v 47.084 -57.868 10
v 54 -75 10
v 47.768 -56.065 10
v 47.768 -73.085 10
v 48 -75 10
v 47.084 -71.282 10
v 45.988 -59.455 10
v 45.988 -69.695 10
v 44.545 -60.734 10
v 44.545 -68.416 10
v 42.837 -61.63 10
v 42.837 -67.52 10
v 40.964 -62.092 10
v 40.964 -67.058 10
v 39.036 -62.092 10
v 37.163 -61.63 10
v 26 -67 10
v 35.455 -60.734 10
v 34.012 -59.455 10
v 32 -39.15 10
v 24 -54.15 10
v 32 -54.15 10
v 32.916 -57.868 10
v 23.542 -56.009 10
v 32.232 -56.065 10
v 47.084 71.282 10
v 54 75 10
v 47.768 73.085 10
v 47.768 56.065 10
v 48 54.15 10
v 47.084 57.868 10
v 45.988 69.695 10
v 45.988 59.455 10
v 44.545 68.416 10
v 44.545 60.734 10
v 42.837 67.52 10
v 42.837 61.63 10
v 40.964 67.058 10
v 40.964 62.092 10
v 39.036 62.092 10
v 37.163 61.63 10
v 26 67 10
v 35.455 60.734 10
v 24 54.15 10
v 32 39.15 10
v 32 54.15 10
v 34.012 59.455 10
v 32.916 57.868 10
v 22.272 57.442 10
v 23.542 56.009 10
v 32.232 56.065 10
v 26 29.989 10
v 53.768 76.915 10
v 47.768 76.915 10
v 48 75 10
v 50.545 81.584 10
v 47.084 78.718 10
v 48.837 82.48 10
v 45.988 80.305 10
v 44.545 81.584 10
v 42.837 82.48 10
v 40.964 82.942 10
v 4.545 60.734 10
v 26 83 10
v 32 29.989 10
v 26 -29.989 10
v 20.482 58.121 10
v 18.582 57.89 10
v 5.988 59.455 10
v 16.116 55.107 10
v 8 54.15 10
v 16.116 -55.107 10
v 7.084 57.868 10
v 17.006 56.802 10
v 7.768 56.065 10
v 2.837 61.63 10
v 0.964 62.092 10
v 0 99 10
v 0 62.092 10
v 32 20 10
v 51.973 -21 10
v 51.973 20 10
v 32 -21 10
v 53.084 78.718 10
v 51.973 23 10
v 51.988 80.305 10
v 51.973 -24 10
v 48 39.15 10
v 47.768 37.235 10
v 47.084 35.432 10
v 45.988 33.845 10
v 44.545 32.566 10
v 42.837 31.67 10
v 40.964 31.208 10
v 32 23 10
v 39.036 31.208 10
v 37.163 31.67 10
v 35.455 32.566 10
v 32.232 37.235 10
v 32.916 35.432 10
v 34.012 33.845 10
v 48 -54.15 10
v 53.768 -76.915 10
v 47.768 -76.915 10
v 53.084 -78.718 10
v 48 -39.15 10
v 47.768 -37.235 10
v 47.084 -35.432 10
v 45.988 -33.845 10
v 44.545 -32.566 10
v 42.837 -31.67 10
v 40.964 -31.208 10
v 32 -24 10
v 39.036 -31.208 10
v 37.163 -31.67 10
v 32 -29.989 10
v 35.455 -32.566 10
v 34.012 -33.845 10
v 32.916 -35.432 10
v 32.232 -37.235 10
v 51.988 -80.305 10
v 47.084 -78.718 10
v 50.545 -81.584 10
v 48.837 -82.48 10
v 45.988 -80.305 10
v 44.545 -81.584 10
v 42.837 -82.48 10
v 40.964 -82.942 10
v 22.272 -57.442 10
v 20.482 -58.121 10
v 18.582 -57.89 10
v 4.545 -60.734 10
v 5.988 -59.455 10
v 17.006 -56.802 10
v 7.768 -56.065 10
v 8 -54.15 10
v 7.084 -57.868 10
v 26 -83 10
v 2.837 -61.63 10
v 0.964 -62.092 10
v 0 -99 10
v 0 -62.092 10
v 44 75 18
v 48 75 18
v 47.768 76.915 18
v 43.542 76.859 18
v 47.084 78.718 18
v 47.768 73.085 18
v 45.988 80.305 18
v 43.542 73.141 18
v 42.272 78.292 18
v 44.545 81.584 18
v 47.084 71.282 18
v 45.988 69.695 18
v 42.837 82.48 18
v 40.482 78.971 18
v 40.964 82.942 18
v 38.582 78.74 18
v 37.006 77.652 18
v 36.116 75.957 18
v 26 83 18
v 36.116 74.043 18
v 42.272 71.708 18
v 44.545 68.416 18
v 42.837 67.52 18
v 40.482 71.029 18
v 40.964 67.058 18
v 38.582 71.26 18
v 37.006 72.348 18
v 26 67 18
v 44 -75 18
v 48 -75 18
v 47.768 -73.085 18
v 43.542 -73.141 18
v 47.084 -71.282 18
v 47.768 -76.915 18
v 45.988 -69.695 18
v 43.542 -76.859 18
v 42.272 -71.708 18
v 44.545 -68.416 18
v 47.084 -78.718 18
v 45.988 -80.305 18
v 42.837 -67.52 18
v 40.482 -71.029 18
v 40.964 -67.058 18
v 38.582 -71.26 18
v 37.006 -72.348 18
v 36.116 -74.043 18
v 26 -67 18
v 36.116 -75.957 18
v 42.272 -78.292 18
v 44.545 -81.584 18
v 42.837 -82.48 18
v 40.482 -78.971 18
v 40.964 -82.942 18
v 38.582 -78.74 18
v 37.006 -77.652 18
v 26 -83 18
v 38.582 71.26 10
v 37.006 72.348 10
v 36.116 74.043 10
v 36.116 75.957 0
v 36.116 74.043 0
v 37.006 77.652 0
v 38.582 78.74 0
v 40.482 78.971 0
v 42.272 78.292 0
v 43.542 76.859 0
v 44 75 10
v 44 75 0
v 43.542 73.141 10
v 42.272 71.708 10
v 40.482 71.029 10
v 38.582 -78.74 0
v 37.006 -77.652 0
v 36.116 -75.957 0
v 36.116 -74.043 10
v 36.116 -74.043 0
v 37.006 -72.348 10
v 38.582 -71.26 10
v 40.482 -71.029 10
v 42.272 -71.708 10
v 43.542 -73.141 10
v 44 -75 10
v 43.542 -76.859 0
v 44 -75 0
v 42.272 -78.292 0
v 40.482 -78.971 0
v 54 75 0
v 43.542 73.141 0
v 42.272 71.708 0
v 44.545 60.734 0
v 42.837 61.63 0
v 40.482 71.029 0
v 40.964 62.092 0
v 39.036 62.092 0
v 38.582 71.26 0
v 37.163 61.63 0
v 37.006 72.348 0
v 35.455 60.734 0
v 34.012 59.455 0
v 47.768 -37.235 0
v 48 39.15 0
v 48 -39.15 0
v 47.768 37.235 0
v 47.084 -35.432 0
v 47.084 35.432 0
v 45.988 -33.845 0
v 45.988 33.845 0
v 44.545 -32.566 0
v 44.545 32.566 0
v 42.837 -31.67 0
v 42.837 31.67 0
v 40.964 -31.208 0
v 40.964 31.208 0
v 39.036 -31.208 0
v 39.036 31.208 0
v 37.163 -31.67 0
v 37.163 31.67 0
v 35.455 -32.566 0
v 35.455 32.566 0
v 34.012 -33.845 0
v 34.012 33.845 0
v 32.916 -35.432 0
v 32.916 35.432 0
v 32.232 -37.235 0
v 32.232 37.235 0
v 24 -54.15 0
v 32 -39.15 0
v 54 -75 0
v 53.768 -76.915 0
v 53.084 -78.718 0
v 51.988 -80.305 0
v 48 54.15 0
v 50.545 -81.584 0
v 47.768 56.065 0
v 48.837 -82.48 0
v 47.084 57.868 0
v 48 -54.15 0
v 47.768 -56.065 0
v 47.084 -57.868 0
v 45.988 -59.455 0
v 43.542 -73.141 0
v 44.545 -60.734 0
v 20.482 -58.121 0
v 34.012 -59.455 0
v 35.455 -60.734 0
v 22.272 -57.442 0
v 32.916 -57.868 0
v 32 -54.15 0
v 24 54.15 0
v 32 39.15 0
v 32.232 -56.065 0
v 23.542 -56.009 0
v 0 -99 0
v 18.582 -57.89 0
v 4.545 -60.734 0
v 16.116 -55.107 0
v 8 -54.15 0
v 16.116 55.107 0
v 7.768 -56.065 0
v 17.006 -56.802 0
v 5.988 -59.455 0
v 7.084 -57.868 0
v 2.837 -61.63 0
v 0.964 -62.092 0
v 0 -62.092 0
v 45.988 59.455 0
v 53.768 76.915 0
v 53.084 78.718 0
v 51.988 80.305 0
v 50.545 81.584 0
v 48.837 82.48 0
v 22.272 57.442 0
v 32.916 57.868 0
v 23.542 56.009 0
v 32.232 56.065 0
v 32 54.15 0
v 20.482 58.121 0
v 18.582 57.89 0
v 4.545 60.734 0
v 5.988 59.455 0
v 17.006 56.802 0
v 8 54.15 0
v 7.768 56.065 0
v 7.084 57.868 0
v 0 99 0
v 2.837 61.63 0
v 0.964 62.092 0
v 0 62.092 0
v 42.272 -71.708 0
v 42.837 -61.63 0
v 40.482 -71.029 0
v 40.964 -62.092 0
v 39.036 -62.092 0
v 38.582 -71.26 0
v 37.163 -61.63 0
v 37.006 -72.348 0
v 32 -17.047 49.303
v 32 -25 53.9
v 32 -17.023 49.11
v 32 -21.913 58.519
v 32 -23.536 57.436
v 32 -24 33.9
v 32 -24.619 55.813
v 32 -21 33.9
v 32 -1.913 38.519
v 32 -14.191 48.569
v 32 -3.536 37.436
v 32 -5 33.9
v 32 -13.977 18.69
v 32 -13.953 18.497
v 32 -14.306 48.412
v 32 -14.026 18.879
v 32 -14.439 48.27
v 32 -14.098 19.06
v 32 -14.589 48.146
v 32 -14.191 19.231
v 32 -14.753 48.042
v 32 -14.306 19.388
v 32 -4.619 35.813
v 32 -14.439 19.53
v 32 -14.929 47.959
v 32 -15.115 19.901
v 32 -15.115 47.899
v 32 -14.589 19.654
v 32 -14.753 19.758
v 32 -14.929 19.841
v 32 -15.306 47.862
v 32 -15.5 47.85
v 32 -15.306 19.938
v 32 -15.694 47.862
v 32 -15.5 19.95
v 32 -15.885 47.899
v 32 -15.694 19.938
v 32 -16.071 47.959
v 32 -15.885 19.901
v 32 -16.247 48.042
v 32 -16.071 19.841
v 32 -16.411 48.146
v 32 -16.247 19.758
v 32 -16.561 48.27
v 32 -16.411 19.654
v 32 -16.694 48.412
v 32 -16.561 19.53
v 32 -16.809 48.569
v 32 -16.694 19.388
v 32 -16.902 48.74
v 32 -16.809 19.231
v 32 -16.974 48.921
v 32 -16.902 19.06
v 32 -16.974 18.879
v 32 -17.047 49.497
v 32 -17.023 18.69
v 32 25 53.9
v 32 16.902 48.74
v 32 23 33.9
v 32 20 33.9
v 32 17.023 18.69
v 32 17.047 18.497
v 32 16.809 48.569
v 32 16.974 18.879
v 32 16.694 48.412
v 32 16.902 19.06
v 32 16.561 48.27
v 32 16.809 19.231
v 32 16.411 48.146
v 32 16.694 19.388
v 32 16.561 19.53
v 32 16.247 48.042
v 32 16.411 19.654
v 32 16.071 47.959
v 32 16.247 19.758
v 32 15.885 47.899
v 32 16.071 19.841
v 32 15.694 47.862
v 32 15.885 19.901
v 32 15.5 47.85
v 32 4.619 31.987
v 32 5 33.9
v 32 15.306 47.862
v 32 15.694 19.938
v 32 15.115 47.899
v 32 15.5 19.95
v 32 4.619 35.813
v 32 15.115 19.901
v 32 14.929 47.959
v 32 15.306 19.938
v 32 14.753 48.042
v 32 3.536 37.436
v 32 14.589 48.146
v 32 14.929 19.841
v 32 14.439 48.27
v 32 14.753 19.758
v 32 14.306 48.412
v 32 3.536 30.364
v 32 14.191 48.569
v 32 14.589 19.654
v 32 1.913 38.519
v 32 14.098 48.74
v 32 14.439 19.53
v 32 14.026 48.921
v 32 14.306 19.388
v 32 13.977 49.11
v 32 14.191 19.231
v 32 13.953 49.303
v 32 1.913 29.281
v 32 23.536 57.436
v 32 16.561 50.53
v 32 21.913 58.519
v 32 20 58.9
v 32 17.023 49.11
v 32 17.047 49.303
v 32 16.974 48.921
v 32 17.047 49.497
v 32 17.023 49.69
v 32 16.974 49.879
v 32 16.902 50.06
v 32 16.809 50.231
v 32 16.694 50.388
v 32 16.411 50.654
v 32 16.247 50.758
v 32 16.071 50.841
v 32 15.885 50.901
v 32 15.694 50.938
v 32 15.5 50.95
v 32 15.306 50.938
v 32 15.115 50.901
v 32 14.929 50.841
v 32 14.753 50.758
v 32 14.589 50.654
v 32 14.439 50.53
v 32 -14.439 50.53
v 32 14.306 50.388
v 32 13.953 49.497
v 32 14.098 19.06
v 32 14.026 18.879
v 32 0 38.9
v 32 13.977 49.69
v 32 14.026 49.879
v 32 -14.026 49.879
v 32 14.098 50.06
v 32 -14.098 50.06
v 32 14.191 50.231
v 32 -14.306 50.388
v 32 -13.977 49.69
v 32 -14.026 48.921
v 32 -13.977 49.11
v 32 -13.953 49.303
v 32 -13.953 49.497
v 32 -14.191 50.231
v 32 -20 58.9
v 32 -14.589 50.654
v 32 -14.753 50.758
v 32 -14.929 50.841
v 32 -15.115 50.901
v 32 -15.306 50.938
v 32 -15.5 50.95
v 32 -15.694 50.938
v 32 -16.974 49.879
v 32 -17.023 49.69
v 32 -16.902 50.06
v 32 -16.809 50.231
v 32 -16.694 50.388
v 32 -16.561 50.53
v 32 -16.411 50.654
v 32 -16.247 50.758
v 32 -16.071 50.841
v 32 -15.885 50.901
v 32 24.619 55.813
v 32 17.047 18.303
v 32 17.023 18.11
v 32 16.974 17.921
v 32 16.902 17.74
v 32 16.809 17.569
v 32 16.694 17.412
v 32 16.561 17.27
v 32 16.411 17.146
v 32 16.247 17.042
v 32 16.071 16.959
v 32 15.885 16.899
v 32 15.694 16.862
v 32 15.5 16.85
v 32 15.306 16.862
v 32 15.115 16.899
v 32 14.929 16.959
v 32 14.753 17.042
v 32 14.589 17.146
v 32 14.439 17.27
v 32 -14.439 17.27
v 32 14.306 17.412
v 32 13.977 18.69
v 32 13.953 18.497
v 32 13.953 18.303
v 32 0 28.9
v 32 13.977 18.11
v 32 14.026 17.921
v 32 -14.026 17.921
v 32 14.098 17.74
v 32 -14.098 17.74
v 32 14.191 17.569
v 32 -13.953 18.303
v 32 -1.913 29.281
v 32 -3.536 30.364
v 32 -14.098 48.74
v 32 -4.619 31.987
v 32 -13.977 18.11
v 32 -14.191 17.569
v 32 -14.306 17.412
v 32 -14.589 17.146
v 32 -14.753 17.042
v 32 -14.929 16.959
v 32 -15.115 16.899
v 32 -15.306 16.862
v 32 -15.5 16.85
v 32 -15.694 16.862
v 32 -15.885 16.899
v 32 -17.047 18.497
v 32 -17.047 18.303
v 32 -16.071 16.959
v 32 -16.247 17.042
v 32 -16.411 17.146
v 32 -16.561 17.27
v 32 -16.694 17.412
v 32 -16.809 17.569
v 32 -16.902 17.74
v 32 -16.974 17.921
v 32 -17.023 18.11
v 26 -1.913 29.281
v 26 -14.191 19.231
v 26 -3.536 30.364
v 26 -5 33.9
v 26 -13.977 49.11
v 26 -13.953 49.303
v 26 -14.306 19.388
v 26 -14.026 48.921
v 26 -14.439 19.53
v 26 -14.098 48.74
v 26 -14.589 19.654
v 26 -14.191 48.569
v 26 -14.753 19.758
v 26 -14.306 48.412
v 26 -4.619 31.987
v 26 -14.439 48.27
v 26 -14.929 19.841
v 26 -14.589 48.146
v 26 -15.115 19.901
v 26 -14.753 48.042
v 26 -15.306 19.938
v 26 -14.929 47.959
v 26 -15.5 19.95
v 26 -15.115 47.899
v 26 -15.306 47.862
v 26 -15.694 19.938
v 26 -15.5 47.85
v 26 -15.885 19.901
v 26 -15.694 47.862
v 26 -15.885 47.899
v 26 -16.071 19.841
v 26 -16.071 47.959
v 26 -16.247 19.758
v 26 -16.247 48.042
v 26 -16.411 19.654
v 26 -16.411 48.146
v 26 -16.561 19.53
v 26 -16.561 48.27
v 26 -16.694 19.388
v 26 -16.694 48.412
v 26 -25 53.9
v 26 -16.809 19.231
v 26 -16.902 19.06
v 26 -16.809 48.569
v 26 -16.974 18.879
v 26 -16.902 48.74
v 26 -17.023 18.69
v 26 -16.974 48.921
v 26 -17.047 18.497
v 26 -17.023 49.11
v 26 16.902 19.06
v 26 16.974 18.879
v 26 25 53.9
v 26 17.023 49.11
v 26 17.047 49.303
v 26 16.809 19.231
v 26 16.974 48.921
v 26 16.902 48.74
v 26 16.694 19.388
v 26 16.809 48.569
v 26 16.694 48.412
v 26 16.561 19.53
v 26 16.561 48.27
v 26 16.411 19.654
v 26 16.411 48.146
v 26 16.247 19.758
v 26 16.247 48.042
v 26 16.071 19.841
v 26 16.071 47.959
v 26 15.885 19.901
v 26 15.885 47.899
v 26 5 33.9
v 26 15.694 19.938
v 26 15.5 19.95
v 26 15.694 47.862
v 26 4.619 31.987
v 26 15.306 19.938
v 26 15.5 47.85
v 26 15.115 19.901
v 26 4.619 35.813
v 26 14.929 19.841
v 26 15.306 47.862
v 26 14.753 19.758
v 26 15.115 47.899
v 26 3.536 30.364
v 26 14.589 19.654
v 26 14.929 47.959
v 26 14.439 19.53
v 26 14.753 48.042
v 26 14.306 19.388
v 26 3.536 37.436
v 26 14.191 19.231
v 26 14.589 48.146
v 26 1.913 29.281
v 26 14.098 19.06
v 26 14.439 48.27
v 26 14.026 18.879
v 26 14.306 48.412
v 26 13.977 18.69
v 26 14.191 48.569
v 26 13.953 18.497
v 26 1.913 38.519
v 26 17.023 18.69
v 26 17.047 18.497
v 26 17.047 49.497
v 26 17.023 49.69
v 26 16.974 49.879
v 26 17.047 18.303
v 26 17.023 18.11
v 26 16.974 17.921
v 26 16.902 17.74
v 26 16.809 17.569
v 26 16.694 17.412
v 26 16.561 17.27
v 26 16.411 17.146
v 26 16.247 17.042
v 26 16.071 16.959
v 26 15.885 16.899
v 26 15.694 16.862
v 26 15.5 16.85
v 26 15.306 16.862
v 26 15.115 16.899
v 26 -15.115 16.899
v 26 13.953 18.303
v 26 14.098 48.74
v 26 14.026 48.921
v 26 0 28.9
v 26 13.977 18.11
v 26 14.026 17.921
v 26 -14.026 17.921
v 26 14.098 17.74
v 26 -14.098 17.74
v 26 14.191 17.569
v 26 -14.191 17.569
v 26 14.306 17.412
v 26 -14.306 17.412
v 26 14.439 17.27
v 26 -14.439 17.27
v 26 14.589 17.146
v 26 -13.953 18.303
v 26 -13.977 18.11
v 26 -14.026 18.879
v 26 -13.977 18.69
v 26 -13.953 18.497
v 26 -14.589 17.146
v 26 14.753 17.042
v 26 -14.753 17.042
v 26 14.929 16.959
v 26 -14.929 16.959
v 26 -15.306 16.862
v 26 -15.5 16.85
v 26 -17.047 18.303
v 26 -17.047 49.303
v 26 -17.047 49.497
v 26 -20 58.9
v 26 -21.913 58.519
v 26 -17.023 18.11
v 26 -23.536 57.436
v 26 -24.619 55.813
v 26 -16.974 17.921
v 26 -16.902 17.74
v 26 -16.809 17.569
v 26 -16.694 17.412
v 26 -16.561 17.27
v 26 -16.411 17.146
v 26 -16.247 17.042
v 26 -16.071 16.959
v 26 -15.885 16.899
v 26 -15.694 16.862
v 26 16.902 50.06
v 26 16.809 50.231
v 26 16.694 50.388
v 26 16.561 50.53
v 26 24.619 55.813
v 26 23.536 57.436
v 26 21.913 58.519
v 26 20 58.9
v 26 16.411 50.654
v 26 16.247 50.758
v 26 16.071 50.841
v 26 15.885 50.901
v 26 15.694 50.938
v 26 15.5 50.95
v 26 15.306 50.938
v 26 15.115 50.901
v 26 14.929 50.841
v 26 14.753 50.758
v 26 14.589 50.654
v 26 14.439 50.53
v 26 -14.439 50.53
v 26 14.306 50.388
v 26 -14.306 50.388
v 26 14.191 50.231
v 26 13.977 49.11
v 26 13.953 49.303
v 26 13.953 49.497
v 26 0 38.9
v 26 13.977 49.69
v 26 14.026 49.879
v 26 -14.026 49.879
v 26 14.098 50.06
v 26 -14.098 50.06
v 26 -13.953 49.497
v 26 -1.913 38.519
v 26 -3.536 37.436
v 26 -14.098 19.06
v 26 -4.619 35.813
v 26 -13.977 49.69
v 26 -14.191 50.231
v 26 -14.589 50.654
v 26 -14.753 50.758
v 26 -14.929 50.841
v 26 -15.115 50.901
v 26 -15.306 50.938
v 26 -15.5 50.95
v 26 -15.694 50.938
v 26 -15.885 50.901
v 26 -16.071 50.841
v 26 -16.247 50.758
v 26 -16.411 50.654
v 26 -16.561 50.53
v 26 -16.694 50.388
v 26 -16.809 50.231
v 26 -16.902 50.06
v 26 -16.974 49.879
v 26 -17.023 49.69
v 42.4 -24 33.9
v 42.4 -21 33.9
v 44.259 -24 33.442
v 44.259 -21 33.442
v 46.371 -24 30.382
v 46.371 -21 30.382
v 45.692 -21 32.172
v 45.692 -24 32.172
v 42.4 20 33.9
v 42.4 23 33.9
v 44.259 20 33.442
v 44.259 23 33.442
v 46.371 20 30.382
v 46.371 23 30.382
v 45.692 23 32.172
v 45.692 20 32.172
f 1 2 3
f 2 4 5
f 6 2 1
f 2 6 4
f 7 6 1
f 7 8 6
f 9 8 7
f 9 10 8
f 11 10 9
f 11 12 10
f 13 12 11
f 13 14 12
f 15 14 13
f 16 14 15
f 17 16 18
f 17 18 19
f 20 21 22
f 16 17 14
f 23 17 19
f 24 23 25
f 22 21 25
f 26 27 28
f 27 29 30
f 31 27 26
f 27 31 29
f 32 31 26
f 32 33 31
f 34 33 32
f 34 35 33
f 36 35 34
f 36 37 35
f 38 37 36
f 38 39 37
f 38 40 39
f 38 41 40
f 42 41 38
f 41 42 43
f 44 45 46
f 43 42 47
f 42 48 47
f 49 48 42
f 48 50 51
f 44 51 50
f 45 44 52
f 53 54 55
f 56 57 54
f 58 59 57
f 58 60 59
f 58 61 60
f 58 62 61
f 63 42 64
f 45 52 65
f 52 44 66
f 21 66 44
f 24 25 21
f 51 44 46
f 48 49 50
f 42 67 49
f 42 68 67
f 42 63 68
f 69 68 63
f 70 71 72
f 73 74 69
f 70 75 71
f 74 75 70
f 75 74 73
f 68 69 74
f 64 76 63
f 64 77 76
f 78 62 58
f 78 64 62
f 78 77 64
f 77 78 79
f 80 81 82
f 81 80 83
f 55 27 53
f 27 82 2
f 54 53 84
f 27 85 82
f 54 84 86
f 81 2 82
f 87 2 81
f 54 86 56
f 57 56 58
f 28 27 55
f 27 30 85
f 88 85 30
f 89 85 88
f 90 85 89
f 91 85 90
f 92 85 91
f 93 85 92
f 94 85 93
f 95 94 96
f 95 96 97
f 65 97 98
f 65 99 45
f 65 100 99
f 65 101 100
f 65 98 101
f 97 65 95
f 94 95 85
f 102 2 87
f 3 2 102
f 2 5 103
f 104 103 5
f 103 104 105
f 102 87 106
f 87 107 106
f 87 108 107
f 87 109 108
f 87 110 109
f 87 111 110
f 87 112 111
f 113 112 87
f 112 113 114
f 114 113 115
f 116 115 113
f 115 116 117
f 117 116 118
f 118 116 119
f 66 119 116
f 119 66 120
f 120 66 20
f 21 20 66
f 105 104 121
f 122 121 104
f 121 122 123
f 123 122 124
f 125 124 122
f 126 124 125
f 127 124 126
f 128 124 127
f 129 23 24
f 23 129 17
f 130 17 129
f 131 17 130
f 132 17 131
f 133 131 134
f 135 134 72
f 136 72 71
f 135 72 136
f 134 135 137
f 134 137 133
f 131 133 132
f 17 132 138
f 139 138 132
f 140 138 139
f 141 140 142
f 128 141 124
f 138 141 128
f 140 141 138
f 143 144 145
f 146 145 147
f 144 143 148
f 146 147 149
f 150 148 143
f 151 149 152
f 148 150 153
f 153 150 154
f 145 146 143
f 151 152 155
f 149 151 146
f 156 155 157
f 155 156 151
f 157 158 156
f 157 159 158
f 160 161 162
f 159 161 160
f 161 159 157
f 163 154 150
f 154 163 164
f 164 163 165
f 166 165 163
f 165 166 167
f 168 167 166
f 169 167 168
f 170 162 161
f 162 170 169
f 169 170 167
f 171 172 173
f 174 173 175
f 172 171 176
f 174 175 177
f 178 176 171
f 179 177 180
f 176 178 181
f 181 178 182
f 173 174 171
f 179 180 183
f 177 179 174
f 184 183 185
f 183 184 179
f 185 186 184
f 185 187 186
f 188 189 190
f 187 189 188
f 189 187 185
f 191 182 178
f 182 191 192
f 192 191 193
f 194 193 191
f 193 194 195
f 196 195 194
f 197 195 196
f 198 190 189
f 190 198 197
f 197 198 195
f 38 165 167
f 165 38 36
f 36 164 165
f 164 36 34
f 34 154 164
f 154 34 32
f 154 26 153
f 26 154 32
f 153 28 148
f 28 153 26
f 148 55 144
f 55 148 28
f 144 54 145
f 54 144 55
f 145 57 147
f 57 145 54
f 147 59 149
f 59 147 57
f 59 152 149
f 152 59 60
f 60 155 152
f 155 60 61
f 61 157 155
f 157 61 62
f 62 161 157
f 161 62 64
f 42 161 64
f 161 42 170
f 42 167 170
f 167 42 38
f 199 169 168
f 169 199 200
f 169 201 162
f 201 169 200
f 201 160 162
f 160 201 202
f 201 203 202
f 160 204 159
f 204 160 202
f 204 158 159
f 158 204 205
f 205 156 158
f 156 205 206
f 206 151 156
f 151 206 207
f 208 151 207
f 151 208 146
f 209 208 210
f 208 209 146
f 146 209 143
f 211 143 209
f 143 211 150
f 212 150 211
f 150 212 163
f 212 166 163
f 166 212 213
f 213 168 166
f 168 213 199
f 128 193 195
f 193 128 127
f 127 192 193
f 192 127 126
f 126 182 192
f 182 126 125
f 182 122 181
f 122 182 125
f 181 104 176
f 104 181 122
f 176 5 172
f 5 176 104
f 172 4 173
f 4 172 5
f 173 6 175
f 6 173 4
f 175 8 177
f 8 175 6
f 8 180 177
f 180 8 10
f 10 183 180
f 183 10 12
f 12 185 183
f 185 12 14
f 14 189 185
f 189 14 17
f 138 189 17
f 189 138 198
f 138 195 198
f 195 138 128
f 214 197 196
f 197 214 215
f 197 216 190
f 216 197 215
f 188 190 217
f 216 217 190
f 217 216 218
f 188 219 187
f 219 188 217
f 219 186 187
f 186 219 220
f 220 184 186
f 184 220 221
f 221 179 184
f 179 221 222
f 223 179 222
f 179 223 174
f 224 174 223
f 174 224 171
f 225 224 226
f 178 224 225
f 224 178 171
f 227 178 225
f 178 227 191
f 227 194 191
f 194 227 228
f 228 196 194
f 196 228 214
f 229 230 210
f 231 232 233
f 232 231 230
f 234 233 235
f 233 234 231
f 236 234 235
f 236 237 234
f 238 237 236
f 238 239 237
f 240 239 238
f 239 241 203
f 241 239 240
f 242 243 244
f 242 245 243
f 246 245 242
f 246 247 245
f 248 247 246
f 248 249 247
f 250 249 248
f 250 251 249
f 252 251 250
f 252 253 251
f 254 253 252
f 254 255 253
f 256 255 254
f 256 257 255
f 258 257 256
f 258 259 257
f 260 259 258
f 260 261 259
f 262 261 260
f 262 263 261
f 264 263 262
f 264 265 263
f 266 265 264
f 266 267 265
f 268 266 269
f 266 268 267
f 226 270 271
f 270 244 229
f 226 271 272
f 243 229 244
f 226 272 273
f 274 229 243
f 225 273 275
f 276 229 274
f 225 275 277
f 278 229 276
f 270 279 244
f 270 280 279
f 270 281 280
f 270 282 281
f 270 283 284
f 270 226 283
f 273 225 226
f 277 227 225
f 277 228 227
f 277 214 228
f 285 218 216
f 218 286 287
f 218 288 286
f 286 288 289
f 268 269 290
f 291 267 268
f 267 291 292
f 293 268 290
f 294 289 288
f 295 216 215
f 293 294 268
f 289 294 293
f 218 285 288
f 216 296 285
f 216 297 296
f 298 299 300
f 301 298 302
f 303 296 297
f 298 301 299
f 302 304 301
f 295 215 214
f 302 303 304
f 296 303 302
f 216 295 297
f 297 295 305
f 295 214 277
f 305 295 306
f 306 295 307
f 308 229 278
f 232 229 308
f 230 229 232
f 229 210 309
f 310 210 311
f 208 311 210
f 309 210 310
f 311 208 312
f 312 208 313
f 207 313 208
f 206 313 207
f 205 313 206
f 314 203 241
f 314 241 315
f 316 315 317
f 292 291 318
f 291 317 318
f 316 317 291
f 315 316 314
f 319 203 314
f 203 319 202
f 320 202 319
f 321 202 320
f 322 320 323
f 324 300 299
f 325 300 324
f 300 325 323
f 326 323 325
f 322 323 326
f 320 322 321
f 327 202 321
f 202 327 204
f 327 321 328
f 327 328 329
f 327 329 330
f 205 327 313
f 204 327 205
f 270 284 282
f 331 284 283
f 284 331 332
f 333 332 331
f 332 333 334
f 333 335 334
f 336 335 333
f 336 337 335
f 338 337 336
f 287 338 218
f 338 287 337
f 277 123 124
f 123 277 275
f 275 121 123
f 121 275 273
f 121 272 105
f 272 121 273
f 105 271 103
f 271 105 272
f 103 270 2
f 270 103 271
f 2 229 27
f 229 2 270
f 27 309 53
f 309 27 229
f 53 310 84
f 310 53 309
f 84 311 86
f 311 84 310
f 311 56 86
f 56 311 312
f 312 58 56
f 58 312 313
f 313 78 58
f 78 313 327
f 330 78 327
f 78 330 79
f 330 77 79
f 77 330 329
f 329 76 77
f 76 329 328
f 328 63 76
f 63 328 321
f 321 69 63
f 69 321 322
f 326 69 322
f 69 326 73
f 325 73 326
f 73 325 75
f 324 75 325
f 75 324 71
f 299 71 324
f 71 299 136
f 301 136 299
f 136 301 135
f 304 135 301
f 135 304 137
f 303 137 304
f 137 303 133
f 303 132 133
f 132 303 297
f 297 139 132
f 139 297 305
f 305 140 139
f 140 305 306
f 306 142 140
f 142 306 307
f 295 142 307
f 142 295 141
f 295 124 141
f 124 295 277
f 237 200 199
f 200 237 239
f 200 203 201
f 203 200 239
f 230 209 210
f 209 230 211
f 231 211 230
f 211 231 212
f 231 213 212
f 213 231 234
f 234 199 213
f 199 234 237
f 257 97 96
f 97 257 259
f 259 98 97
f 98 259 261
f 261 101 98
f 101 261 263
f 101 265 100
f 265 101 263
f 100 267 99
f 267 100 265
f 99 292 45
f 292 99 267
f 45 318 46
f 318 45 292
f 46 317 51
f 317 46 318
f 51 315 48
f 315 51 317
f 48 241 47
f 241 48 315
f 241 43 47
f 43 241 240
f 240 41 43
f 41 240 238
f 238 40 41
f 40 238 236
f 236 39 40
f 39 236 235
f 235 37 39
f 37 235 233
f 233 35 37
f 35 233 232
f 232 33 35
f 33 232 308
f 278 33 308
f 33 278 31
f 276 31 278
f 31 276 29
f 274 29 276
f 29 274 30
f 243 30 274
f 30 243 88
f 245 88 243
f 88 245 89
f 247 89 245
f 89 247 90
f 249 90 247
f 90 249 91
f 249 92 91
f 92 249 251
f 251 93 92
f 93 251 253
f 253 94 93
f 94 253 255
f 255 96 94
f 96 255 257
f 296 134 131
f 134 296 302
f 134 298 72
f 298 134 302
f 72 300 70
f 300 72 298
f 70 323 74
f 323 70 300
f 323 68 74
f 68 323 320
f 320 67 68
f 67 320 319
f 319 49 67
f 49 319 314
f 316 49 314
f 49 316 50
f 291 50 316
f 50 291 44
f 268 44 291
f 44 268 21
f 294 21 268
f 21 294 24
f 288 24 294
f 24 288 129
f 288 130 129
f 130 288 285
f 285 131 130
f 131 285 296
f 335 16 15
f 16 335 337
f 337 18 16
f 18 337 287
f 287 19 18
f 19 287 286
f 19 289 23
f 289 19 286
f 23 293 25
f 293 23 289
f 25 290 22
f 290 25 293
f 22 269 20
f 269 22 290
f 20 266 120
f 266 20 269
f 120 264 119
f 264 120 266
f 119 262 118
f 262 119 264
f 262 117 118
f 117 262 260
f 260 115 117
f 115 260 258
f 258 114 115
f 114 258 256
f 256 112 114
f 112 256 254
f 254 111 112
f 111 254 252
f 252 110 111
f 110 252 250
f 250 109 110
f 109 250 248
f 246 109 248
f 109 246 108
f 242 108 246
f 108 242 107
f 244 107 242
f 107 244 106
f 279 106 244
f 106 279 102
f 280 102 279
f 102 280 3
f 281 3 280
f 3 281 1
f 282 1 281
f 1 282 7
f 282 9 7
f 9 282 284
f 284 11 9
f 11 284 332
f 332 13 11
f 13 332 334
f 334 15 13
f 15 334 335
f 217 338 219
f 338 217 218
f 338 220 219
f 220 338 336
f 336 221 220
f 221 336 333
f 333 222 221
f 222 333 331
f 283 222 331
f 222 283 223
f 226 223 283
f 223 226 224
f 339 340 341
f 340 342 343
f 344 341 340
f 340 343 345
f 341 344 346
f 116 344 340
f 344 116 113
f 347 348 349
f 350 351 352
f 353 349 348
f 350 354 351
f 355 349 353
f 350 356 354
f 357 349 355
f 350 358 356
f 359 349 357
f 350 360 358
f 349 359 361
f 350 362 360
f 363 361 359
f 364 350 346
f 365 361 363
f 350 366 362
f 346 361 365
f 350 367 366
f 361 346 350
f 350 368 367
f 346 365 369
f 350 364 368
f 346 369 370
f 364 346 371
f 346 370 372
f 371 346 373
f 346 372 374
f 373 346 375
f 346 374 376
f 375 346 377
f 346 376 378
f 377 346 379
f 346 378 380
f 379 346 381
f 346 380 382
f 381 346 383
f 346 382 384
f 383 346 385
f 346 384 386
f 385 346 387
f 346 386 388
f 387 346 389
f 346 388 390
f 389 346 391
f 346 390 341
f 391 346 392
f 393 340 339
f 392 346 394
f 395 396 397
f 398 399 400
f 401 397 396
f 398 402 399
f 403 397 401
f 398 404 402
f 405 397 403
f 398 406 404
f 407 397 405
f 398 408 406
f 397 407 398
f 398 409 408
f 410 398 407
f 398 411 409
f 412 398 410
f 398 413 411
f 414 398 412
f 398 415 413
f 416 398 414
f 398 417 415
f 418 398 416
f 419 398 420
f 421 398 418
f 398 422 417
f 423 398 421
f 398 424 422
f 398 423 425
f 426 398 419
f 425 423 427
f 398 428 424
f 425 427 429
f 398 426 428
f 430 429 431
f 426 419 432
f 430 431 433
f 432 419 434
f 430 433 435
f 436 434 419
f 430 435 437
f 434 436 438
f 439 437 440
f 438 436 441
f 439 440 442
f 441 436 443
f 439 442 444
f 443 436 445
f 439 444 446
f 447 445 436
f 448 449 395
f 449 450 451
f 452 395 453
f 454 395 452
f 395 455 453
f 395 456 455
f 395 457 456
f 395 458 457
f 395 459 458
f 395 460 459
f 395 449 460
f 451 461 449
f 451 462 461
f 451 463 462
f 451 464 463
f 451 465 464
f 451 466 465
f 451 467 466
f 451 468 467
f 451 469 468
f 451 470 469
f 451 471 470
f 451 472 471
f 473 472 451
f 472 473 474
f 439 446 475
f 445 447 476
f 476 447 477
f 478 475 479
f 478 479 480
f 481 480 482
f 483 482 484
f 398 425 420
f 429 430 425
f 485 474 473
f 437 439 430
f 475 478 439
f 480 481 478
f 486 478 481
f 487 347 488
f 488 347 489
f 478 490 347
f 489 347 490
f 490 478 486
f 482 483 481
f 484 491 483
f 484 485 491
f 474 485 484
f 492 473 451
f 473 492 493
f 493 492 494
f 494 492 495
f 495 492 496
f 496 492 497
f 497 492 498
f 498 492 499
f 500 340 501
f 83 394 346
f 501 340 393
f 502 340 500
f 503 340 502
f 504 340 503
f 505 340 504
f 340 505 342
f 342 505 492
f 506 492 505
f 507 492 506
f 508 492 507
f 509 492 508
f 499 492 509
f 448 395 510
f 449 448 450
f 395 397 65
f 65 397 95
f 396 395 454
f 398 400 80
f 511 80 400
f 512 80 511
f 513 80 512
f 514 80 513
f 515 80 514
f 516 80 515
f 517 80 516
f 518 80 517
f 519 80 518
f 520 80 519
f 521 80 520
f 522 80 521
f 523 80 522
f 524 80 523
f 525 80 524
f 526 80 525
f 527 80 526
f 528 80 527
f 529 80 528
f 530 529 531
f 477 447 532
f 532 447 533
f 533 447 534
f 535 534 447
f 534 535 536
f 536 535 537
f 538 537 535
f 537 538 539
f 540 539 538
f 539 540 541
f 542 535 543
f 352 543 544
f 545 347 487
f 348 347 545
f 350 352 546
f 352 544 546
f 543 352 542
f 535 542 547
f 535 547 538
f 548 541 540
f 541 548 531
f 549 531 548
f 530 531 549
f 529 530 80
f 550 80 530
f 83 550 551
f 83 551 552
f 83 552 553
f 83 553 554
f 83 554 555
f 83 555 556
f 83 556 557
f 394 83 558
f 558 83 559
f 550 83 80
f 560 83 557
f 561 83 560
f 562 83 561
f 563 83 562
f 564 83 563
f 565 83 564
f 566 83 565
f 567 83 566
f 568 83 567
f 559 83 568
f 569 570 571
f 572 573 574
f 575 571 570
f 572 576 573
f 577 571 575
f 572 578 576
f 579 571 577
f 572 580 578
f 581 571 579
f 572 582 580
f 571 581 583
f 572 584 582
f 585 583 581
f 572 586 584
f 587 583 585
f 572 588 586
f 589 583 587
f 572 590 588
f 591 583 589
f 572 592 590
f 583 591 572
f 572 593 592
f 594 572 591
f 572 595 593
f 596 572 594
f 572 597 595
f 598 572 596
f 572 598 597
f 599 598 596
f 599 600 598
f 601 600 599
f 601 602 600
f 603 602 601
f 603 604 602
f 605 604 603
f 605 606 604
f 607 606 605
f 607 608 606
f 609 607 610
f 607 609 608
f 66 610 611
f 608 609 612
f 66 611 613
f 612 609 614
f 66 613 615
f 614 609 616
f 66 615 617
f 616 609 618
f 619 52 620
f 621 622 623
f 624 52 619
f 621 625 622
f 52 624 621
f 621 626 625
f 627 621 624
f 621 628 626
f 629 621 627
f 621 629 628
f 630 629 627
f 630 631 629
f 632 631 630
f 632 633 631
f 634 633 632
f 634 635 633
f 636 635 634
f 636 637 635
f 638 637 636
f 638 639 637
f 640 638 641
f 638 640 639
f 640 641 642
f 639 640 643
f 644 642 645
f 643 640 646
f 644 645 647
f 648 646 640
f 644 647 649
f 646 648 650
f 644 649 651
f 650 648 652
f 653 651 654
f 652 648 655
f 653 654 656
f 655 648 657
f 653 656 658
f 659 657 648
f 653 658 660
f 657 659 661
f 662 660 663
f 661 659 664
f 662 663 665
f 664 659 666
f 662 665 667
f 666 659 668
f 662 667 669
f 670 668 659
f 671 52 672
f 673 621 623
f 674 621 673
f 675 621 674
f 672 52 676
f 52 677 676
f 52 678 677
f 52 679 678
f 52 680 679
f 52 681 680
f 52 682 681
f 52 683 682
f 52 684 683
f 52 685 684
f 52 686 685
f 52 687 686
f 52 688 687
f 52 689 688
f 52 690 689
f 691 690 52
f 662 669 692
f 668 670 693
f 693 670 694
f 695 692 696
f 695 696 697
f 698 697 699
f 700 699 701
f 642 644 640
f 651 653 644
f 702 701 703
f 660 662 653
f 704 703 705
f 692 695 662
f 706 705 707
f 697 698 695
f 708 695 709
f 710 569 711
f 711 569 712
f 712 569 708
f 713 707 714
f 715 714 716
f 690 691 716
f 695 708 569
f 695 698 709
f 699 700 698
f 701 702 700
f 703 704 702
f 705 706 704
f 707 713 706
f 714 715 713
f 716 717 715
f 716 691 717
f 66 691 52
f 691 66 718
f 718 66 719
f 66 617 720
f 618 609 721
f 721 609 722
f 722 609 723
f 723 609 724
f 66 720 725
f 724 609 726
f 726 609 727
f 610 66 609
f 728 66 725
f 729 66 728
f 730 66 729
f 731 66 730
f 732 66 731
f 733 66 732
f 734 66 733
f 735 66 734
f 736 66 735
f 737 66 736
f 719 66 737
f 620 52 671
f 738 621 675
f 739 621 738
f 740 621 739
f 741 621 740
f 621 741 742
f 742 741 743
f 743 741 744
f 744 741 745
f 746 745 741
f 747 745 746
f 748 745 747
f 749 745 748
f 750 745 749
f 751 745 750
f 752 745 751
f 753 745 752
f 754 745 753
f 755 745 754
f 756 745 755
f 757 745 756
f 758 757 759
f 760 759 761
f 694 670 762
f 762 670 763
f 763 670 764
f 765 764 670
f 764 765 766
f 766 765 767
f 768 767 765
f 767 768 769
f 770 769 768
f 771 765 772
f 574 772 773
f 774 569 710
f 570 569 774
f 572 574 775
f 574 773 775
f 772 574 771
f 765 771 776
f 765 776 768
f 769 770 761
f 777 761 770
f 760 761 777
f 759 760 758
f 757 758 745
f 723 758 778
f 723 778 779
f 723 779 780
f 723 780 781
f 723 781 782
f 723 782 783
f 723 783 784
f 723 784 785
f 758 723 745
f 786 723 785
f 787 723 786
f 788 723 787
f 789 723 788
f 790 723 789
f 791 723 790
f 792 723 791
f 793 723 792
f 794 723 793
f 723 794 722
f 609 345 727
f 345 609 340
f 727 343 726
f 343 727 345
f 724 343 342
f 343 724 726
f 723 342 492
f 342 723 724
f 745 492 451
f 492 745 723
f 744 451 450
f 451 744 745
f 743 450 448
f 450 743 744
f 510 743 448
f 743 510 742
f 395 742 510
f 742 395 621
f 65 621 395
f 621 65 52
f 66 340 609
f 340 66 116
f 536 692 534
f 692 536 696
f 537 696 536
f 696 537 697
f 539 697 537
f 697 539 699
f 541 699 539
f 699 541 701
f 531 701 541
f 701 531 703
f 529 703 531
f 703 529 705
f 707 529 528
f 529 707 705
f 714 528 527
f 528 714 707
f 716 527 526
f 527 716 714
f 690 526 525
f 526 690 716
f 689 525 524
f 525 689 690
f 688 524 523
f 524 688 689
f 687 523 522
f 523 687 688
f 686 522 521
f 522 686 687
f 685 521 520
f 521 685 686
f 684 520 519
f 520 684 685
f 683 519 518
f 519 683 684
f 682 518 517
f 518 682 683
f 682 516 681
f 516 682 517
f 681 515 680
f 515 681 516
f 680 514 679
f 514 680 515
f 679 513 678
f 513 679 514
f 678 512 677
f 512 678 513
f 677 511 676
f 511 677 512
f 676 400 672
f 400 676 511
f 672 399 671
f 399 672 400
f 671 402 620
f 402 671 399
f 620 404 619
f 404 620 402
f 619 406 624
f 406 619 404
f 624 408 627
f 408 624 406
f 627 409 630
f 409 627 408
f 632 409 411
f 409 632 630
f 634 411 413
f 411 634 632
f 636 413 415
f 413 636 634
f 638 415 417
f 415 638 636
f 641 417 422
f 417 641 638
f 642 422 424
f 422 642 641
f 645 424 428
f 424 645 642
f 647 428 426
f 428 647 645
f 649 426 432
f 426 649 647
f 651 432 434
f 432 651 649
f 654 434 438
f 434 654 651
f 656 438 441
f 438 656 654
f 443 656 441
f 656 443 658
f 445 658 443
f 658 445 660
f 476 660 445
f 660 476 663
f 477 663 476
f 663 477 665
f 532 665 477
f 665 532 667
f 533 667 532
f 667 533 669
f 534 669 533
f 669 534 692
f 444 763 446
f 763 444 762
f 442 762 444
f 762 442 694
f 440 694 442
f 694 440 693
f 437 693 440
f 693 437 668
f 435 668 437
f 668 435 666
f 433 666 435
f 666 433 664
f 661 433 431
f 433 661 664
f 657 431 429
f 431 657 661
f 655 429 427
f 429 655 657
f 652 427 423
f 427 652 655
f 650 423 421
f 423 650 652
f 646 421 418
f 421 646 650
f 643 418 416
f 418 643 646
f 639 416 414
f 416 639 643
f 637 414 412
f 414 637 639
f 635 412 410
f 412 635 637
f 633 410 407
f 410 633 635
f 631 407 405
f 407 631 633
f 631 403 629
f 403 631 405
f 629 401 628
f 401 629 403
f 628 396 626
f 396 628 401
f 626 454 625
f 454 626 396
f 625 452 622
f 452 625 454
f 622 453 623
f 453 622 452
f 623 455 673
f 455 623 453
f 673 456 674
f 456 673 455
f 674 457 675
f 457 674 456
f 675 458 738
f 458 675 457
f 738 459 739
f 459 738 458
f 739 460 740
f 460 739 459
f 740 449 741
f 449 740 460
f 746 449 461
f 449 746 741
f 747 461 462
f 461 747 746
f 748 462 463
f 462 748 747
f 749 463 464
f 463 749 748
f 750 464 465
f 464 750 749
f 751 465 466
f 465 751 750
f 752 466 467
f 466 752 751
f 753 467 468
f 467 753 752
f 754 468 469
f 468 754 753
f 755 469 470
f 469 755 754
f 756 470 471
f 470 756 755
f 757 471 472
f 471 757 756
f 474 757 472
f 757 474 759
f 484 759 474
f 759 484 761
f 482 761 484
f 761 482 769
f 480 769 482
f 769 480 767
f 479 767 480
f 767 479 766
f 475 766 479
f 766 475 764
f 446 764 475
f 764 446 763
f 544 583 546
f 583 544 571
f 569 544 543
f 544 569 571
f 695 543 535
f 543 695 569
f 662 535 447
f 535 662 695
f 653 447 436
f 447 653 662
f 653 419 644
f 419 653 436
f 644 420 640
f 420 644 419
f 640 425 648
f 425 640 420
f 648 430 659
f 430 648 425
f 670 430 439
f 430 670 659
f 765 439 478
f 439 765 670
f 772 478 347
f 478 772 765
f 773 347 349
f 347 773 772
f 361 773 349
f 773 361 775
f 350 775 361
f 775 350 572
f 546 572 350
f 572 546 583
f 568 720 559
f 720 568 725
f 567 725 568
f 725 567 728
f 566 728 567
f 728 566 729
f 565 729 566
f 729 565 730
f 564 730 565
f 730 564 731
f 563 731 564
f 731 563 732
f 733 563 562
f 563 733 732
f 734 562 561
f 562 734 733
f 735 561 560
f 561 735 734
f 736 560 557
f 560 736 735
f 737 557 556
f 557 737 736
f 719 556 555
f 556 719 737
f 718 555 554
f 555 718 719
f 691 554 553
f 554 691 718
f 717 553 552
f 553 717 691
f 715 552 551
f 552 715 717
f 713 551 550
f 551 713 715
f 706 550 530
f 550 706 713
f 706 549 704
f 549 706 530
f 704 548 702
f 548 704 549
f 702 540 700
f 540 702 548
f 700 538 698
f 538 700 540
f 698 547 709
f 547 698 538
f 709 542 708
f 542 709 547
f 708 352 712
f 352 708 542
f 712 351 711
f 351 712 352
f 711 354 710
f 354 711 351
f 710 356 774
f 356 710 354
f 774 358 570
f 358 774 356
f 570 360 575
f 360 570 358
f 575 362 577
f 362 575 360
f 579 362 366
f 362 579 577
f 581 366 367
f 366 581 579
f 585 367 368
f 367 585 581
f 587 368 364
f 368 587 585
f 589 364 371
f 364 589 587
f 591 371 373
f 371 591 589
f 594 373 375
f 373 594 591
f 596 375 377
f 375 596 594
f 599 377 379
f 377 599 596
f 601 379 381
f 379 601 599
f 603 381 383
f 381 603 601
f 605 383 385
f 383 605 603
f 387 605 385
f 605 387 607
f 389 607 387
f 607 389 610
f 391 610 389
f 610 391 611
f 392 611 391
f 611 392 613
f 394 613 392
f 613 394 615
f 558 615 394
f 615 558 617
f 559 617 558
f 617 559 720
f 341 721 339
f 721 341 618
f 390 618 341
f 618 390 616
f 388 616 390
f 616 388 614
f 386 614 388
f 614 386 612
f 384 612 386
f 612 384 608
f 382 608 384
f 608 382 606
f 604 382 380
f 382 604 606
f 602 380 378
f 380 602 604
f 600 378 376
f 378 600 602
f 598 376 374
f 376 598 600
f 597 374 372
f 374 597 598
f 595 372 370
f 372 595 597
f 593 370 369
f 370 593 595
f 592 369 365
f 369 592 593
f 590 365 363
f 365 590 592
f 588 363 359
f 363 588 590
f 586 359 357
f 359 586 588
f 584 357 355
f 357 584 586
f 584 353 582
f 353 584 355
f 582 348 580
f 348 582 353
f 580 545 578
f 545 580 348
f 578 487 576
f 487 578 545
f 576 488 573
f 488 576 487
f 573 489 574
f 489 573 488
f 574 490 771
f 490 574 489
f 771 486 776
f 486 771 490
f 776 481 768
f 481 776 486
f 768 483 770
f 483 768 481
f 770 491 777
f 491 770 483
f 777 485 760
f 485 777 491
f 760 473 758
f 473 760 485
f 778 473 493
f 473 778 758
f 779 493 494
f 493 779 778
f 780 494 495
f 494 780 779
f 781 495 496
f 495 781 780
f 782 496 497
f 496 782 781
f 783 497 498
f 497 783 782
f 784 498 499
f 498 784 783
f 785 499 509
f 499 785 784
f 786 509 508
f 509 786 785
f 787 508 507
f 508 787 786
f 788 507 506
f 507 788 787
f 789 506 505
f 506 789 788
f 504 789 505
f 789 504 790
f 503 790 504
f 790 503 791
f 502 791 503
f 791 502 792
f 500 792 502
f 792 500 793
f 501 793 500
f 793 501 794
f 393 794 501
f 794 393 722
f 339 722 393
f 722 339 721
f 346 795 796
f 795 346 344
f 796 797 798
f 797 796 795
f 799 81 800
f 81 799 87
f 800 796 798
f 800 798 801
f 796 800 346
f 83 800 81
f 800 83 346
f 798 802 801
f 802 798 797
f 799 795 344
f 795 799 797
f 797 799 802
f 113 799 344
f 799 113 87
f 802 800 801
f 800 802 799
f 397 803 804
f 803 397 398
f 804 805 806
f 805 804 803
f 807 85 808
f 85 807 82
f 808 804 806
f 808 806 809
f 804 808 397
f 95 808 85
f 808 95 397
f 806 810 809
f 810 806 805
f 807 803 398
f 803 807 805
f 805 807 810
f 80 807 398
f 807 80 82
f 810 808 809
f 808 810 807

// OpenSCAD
//include <z_components.scad>

y_rod_height = 40;
y_rod_spacing = 150;

rod_radius = 4;
rod_end_width = rod_radius*2 + 8;
rod_end_height = rod_radius*2 + 6;


module y_end_base(){
	//y_end();
	translate([0,0,10])
		y_rod_end();
	
	linear_extrude(height=10)
		y_end_base_2d();

}


module y_end_with_motor(){
	union(){

		y_end_base();

		translate([y_rod_height - 8, 0, 9.9])
			rotate([0,-90,0])
				y_end_motor_bracket();
	}
}


//y_end_motor_bracket();
y_end_with_motor();

module y_end_motor_bracket(){

	bracket_thickness = 6;

	union(){
	
		linear_extrude(height=bracket_thickness)
			y_end_motor_bracket_2d();
	
		translate([0,-(24),0])
			rotate([-90,0,0])
				linear_extrude(height=bracket_thickness/2)
					y_end_motor_bracket_support_2d();
	
		translate([0,20 ,0])
			rotate([-90,0,0])
				linear_extrude(height=bracket_thickness/2)
					y_end_motor_bracket_support_2d();
	}

}

module y_end_motor_bracket_support_2d(){

	support_thickness = 4;
	support_height = 20;

	hull(){
		polygon(points = [[0,0], [0,support_height], [support_height * 1.2,0]]);
		translate([support_height, support_height * 0.62 - 2]) 
			circle(r=4);
		}
}


module y_end_motor_bracket_2d(){

	bracket_depth = 49;
	motor_centre = 24;
	bracket_round_radius = 5;

	bracket_width = 60;
	bracket_small_width = 40;

	stepper_bolt_hole = 1.55;
	stepper_bolt_hole_offset = 31/2;

	difference(){
	
		hull(){	
			translate([bracket_depth - bracket_round_radius, bracket_small_width / 2]) 
				circle(r=bracket_round_radius);	
			translate([bracket_depth - bracket_round_radius, -bracket_small_width / 2])
				circle(r=bracket_round_radius);	
			polygon(points=[
				[0, bracket_width/2], 
				[bracket_depth, bracket_small_width/2 ],
				[bracket_depth, -bracket_small_width/2 ],
				[0, -bracket_width/2],
			]);
		}

		translate([motor_centre, 0])
				circle(r=bracket_round_radius);	

		// holes for stepper bolts
		#translate([motor_centre - stepper_bolt_hole_offset, stepper_bolt_hole_offset])
			circle(r=stepper_bolt_hole, $fn=50);
		#translate([motor_centre + stepper_bolt_hole_offset, stepper_bolt_hole_offset])
			circle(r=stepper_bolt_hole, $fn=50);
		#translate([motor_centre - stepper_bolt_hole_offset, -stepper_bolt_hole_offset])
			circle(r=stepper_bolt_hole, $fn=50);
		#translate([motor_centre + stepper_bolt_hole_offset, -stepper_bolt_hole_offset])
			circle(r=stepper_bolt_hole, $fn=50);


	}
}
 

module y_rod_end_2d(){

	difference(){

		hull(){
			translate([rod_end_height, 0])
				circle(r=rod_end_width / 2);
			polygon(points = [[0,rod_end_width/2], [rod_end_height,0],[0,-rod_end_width/2]]);
		}
		
		#translate([rod_end_height,0])
			circle(r=rod_radius);
	}

}



module y_rod_end(){

	//	rotate([0,-90,0]) z_bottom();
	linear_extrude(height=8){
		translate([y_rod_height - rod_end_height, -y_rod_spacing/2])
			y_rod_end_2d();
		translate([y_rod_height - rod_end_height, +y_rod_spacing/2])
			y_rod_end_2d();
	}
}

module y_end_base_2d(){

	edge_to_midpoint = y_rod_spacing/2;
	base_inset = -24;

	difference(){

		hull(){
			translate([y_rod_height + 6, -edge_to_midpoint])
				circle(r=rod_end_width / 2);
			translate([y_rod_height + 6, edge_to_midpoint])
				circle(r=rod_end_width / 2);
			polygon(points = [[0,edge_to_midpoint-base_inset], [rod_end_height,0],[0,-edge_to_midpoint+base_inset]]);
		}
		
		hull(){
			translate([y_rod_height, -0.722 * edge_to_midpoint])
				circle(r=rod_end_width / 2);
			translate([y_rod_height, -0.522 * edge_to_midpoint])
				circle(r=rod_end_width / 2);

		}

		hull(){
			translate([y_rod_height, 0.722 * edge_to_midpoint])
				circle(r=rod_end_width / 2);
			translate([y_rod_height, 0.522 * edge_to_midpoint])
				circle(r=rod_end_width / 2);

		}


		hull(){
			translate([y_rod_height / 2, -0.722 * edge_to_midpoint])
				circle(r=rod_end_width / 4);
			translate([y_rod_height / 2, 0.722 * edge_to_midpoint])
				circle(r=rod_end_width / 4);

		}


		hull(){
			translate([0, -0.722 * edge_to_midpoint])
				circle(r=rod_end_width / 2);
			translate([0, 0.722 * edge_to_midpoint])
				circle(r=rod_end_width / 2);

		}

		translate([y_rod_height, -y_rod_spacing/2])
			circle(r=rod_radius);

		translate([y_rod_height, +y_rod_spacing/2])
			circle(r=rod_radius);

	}

}
